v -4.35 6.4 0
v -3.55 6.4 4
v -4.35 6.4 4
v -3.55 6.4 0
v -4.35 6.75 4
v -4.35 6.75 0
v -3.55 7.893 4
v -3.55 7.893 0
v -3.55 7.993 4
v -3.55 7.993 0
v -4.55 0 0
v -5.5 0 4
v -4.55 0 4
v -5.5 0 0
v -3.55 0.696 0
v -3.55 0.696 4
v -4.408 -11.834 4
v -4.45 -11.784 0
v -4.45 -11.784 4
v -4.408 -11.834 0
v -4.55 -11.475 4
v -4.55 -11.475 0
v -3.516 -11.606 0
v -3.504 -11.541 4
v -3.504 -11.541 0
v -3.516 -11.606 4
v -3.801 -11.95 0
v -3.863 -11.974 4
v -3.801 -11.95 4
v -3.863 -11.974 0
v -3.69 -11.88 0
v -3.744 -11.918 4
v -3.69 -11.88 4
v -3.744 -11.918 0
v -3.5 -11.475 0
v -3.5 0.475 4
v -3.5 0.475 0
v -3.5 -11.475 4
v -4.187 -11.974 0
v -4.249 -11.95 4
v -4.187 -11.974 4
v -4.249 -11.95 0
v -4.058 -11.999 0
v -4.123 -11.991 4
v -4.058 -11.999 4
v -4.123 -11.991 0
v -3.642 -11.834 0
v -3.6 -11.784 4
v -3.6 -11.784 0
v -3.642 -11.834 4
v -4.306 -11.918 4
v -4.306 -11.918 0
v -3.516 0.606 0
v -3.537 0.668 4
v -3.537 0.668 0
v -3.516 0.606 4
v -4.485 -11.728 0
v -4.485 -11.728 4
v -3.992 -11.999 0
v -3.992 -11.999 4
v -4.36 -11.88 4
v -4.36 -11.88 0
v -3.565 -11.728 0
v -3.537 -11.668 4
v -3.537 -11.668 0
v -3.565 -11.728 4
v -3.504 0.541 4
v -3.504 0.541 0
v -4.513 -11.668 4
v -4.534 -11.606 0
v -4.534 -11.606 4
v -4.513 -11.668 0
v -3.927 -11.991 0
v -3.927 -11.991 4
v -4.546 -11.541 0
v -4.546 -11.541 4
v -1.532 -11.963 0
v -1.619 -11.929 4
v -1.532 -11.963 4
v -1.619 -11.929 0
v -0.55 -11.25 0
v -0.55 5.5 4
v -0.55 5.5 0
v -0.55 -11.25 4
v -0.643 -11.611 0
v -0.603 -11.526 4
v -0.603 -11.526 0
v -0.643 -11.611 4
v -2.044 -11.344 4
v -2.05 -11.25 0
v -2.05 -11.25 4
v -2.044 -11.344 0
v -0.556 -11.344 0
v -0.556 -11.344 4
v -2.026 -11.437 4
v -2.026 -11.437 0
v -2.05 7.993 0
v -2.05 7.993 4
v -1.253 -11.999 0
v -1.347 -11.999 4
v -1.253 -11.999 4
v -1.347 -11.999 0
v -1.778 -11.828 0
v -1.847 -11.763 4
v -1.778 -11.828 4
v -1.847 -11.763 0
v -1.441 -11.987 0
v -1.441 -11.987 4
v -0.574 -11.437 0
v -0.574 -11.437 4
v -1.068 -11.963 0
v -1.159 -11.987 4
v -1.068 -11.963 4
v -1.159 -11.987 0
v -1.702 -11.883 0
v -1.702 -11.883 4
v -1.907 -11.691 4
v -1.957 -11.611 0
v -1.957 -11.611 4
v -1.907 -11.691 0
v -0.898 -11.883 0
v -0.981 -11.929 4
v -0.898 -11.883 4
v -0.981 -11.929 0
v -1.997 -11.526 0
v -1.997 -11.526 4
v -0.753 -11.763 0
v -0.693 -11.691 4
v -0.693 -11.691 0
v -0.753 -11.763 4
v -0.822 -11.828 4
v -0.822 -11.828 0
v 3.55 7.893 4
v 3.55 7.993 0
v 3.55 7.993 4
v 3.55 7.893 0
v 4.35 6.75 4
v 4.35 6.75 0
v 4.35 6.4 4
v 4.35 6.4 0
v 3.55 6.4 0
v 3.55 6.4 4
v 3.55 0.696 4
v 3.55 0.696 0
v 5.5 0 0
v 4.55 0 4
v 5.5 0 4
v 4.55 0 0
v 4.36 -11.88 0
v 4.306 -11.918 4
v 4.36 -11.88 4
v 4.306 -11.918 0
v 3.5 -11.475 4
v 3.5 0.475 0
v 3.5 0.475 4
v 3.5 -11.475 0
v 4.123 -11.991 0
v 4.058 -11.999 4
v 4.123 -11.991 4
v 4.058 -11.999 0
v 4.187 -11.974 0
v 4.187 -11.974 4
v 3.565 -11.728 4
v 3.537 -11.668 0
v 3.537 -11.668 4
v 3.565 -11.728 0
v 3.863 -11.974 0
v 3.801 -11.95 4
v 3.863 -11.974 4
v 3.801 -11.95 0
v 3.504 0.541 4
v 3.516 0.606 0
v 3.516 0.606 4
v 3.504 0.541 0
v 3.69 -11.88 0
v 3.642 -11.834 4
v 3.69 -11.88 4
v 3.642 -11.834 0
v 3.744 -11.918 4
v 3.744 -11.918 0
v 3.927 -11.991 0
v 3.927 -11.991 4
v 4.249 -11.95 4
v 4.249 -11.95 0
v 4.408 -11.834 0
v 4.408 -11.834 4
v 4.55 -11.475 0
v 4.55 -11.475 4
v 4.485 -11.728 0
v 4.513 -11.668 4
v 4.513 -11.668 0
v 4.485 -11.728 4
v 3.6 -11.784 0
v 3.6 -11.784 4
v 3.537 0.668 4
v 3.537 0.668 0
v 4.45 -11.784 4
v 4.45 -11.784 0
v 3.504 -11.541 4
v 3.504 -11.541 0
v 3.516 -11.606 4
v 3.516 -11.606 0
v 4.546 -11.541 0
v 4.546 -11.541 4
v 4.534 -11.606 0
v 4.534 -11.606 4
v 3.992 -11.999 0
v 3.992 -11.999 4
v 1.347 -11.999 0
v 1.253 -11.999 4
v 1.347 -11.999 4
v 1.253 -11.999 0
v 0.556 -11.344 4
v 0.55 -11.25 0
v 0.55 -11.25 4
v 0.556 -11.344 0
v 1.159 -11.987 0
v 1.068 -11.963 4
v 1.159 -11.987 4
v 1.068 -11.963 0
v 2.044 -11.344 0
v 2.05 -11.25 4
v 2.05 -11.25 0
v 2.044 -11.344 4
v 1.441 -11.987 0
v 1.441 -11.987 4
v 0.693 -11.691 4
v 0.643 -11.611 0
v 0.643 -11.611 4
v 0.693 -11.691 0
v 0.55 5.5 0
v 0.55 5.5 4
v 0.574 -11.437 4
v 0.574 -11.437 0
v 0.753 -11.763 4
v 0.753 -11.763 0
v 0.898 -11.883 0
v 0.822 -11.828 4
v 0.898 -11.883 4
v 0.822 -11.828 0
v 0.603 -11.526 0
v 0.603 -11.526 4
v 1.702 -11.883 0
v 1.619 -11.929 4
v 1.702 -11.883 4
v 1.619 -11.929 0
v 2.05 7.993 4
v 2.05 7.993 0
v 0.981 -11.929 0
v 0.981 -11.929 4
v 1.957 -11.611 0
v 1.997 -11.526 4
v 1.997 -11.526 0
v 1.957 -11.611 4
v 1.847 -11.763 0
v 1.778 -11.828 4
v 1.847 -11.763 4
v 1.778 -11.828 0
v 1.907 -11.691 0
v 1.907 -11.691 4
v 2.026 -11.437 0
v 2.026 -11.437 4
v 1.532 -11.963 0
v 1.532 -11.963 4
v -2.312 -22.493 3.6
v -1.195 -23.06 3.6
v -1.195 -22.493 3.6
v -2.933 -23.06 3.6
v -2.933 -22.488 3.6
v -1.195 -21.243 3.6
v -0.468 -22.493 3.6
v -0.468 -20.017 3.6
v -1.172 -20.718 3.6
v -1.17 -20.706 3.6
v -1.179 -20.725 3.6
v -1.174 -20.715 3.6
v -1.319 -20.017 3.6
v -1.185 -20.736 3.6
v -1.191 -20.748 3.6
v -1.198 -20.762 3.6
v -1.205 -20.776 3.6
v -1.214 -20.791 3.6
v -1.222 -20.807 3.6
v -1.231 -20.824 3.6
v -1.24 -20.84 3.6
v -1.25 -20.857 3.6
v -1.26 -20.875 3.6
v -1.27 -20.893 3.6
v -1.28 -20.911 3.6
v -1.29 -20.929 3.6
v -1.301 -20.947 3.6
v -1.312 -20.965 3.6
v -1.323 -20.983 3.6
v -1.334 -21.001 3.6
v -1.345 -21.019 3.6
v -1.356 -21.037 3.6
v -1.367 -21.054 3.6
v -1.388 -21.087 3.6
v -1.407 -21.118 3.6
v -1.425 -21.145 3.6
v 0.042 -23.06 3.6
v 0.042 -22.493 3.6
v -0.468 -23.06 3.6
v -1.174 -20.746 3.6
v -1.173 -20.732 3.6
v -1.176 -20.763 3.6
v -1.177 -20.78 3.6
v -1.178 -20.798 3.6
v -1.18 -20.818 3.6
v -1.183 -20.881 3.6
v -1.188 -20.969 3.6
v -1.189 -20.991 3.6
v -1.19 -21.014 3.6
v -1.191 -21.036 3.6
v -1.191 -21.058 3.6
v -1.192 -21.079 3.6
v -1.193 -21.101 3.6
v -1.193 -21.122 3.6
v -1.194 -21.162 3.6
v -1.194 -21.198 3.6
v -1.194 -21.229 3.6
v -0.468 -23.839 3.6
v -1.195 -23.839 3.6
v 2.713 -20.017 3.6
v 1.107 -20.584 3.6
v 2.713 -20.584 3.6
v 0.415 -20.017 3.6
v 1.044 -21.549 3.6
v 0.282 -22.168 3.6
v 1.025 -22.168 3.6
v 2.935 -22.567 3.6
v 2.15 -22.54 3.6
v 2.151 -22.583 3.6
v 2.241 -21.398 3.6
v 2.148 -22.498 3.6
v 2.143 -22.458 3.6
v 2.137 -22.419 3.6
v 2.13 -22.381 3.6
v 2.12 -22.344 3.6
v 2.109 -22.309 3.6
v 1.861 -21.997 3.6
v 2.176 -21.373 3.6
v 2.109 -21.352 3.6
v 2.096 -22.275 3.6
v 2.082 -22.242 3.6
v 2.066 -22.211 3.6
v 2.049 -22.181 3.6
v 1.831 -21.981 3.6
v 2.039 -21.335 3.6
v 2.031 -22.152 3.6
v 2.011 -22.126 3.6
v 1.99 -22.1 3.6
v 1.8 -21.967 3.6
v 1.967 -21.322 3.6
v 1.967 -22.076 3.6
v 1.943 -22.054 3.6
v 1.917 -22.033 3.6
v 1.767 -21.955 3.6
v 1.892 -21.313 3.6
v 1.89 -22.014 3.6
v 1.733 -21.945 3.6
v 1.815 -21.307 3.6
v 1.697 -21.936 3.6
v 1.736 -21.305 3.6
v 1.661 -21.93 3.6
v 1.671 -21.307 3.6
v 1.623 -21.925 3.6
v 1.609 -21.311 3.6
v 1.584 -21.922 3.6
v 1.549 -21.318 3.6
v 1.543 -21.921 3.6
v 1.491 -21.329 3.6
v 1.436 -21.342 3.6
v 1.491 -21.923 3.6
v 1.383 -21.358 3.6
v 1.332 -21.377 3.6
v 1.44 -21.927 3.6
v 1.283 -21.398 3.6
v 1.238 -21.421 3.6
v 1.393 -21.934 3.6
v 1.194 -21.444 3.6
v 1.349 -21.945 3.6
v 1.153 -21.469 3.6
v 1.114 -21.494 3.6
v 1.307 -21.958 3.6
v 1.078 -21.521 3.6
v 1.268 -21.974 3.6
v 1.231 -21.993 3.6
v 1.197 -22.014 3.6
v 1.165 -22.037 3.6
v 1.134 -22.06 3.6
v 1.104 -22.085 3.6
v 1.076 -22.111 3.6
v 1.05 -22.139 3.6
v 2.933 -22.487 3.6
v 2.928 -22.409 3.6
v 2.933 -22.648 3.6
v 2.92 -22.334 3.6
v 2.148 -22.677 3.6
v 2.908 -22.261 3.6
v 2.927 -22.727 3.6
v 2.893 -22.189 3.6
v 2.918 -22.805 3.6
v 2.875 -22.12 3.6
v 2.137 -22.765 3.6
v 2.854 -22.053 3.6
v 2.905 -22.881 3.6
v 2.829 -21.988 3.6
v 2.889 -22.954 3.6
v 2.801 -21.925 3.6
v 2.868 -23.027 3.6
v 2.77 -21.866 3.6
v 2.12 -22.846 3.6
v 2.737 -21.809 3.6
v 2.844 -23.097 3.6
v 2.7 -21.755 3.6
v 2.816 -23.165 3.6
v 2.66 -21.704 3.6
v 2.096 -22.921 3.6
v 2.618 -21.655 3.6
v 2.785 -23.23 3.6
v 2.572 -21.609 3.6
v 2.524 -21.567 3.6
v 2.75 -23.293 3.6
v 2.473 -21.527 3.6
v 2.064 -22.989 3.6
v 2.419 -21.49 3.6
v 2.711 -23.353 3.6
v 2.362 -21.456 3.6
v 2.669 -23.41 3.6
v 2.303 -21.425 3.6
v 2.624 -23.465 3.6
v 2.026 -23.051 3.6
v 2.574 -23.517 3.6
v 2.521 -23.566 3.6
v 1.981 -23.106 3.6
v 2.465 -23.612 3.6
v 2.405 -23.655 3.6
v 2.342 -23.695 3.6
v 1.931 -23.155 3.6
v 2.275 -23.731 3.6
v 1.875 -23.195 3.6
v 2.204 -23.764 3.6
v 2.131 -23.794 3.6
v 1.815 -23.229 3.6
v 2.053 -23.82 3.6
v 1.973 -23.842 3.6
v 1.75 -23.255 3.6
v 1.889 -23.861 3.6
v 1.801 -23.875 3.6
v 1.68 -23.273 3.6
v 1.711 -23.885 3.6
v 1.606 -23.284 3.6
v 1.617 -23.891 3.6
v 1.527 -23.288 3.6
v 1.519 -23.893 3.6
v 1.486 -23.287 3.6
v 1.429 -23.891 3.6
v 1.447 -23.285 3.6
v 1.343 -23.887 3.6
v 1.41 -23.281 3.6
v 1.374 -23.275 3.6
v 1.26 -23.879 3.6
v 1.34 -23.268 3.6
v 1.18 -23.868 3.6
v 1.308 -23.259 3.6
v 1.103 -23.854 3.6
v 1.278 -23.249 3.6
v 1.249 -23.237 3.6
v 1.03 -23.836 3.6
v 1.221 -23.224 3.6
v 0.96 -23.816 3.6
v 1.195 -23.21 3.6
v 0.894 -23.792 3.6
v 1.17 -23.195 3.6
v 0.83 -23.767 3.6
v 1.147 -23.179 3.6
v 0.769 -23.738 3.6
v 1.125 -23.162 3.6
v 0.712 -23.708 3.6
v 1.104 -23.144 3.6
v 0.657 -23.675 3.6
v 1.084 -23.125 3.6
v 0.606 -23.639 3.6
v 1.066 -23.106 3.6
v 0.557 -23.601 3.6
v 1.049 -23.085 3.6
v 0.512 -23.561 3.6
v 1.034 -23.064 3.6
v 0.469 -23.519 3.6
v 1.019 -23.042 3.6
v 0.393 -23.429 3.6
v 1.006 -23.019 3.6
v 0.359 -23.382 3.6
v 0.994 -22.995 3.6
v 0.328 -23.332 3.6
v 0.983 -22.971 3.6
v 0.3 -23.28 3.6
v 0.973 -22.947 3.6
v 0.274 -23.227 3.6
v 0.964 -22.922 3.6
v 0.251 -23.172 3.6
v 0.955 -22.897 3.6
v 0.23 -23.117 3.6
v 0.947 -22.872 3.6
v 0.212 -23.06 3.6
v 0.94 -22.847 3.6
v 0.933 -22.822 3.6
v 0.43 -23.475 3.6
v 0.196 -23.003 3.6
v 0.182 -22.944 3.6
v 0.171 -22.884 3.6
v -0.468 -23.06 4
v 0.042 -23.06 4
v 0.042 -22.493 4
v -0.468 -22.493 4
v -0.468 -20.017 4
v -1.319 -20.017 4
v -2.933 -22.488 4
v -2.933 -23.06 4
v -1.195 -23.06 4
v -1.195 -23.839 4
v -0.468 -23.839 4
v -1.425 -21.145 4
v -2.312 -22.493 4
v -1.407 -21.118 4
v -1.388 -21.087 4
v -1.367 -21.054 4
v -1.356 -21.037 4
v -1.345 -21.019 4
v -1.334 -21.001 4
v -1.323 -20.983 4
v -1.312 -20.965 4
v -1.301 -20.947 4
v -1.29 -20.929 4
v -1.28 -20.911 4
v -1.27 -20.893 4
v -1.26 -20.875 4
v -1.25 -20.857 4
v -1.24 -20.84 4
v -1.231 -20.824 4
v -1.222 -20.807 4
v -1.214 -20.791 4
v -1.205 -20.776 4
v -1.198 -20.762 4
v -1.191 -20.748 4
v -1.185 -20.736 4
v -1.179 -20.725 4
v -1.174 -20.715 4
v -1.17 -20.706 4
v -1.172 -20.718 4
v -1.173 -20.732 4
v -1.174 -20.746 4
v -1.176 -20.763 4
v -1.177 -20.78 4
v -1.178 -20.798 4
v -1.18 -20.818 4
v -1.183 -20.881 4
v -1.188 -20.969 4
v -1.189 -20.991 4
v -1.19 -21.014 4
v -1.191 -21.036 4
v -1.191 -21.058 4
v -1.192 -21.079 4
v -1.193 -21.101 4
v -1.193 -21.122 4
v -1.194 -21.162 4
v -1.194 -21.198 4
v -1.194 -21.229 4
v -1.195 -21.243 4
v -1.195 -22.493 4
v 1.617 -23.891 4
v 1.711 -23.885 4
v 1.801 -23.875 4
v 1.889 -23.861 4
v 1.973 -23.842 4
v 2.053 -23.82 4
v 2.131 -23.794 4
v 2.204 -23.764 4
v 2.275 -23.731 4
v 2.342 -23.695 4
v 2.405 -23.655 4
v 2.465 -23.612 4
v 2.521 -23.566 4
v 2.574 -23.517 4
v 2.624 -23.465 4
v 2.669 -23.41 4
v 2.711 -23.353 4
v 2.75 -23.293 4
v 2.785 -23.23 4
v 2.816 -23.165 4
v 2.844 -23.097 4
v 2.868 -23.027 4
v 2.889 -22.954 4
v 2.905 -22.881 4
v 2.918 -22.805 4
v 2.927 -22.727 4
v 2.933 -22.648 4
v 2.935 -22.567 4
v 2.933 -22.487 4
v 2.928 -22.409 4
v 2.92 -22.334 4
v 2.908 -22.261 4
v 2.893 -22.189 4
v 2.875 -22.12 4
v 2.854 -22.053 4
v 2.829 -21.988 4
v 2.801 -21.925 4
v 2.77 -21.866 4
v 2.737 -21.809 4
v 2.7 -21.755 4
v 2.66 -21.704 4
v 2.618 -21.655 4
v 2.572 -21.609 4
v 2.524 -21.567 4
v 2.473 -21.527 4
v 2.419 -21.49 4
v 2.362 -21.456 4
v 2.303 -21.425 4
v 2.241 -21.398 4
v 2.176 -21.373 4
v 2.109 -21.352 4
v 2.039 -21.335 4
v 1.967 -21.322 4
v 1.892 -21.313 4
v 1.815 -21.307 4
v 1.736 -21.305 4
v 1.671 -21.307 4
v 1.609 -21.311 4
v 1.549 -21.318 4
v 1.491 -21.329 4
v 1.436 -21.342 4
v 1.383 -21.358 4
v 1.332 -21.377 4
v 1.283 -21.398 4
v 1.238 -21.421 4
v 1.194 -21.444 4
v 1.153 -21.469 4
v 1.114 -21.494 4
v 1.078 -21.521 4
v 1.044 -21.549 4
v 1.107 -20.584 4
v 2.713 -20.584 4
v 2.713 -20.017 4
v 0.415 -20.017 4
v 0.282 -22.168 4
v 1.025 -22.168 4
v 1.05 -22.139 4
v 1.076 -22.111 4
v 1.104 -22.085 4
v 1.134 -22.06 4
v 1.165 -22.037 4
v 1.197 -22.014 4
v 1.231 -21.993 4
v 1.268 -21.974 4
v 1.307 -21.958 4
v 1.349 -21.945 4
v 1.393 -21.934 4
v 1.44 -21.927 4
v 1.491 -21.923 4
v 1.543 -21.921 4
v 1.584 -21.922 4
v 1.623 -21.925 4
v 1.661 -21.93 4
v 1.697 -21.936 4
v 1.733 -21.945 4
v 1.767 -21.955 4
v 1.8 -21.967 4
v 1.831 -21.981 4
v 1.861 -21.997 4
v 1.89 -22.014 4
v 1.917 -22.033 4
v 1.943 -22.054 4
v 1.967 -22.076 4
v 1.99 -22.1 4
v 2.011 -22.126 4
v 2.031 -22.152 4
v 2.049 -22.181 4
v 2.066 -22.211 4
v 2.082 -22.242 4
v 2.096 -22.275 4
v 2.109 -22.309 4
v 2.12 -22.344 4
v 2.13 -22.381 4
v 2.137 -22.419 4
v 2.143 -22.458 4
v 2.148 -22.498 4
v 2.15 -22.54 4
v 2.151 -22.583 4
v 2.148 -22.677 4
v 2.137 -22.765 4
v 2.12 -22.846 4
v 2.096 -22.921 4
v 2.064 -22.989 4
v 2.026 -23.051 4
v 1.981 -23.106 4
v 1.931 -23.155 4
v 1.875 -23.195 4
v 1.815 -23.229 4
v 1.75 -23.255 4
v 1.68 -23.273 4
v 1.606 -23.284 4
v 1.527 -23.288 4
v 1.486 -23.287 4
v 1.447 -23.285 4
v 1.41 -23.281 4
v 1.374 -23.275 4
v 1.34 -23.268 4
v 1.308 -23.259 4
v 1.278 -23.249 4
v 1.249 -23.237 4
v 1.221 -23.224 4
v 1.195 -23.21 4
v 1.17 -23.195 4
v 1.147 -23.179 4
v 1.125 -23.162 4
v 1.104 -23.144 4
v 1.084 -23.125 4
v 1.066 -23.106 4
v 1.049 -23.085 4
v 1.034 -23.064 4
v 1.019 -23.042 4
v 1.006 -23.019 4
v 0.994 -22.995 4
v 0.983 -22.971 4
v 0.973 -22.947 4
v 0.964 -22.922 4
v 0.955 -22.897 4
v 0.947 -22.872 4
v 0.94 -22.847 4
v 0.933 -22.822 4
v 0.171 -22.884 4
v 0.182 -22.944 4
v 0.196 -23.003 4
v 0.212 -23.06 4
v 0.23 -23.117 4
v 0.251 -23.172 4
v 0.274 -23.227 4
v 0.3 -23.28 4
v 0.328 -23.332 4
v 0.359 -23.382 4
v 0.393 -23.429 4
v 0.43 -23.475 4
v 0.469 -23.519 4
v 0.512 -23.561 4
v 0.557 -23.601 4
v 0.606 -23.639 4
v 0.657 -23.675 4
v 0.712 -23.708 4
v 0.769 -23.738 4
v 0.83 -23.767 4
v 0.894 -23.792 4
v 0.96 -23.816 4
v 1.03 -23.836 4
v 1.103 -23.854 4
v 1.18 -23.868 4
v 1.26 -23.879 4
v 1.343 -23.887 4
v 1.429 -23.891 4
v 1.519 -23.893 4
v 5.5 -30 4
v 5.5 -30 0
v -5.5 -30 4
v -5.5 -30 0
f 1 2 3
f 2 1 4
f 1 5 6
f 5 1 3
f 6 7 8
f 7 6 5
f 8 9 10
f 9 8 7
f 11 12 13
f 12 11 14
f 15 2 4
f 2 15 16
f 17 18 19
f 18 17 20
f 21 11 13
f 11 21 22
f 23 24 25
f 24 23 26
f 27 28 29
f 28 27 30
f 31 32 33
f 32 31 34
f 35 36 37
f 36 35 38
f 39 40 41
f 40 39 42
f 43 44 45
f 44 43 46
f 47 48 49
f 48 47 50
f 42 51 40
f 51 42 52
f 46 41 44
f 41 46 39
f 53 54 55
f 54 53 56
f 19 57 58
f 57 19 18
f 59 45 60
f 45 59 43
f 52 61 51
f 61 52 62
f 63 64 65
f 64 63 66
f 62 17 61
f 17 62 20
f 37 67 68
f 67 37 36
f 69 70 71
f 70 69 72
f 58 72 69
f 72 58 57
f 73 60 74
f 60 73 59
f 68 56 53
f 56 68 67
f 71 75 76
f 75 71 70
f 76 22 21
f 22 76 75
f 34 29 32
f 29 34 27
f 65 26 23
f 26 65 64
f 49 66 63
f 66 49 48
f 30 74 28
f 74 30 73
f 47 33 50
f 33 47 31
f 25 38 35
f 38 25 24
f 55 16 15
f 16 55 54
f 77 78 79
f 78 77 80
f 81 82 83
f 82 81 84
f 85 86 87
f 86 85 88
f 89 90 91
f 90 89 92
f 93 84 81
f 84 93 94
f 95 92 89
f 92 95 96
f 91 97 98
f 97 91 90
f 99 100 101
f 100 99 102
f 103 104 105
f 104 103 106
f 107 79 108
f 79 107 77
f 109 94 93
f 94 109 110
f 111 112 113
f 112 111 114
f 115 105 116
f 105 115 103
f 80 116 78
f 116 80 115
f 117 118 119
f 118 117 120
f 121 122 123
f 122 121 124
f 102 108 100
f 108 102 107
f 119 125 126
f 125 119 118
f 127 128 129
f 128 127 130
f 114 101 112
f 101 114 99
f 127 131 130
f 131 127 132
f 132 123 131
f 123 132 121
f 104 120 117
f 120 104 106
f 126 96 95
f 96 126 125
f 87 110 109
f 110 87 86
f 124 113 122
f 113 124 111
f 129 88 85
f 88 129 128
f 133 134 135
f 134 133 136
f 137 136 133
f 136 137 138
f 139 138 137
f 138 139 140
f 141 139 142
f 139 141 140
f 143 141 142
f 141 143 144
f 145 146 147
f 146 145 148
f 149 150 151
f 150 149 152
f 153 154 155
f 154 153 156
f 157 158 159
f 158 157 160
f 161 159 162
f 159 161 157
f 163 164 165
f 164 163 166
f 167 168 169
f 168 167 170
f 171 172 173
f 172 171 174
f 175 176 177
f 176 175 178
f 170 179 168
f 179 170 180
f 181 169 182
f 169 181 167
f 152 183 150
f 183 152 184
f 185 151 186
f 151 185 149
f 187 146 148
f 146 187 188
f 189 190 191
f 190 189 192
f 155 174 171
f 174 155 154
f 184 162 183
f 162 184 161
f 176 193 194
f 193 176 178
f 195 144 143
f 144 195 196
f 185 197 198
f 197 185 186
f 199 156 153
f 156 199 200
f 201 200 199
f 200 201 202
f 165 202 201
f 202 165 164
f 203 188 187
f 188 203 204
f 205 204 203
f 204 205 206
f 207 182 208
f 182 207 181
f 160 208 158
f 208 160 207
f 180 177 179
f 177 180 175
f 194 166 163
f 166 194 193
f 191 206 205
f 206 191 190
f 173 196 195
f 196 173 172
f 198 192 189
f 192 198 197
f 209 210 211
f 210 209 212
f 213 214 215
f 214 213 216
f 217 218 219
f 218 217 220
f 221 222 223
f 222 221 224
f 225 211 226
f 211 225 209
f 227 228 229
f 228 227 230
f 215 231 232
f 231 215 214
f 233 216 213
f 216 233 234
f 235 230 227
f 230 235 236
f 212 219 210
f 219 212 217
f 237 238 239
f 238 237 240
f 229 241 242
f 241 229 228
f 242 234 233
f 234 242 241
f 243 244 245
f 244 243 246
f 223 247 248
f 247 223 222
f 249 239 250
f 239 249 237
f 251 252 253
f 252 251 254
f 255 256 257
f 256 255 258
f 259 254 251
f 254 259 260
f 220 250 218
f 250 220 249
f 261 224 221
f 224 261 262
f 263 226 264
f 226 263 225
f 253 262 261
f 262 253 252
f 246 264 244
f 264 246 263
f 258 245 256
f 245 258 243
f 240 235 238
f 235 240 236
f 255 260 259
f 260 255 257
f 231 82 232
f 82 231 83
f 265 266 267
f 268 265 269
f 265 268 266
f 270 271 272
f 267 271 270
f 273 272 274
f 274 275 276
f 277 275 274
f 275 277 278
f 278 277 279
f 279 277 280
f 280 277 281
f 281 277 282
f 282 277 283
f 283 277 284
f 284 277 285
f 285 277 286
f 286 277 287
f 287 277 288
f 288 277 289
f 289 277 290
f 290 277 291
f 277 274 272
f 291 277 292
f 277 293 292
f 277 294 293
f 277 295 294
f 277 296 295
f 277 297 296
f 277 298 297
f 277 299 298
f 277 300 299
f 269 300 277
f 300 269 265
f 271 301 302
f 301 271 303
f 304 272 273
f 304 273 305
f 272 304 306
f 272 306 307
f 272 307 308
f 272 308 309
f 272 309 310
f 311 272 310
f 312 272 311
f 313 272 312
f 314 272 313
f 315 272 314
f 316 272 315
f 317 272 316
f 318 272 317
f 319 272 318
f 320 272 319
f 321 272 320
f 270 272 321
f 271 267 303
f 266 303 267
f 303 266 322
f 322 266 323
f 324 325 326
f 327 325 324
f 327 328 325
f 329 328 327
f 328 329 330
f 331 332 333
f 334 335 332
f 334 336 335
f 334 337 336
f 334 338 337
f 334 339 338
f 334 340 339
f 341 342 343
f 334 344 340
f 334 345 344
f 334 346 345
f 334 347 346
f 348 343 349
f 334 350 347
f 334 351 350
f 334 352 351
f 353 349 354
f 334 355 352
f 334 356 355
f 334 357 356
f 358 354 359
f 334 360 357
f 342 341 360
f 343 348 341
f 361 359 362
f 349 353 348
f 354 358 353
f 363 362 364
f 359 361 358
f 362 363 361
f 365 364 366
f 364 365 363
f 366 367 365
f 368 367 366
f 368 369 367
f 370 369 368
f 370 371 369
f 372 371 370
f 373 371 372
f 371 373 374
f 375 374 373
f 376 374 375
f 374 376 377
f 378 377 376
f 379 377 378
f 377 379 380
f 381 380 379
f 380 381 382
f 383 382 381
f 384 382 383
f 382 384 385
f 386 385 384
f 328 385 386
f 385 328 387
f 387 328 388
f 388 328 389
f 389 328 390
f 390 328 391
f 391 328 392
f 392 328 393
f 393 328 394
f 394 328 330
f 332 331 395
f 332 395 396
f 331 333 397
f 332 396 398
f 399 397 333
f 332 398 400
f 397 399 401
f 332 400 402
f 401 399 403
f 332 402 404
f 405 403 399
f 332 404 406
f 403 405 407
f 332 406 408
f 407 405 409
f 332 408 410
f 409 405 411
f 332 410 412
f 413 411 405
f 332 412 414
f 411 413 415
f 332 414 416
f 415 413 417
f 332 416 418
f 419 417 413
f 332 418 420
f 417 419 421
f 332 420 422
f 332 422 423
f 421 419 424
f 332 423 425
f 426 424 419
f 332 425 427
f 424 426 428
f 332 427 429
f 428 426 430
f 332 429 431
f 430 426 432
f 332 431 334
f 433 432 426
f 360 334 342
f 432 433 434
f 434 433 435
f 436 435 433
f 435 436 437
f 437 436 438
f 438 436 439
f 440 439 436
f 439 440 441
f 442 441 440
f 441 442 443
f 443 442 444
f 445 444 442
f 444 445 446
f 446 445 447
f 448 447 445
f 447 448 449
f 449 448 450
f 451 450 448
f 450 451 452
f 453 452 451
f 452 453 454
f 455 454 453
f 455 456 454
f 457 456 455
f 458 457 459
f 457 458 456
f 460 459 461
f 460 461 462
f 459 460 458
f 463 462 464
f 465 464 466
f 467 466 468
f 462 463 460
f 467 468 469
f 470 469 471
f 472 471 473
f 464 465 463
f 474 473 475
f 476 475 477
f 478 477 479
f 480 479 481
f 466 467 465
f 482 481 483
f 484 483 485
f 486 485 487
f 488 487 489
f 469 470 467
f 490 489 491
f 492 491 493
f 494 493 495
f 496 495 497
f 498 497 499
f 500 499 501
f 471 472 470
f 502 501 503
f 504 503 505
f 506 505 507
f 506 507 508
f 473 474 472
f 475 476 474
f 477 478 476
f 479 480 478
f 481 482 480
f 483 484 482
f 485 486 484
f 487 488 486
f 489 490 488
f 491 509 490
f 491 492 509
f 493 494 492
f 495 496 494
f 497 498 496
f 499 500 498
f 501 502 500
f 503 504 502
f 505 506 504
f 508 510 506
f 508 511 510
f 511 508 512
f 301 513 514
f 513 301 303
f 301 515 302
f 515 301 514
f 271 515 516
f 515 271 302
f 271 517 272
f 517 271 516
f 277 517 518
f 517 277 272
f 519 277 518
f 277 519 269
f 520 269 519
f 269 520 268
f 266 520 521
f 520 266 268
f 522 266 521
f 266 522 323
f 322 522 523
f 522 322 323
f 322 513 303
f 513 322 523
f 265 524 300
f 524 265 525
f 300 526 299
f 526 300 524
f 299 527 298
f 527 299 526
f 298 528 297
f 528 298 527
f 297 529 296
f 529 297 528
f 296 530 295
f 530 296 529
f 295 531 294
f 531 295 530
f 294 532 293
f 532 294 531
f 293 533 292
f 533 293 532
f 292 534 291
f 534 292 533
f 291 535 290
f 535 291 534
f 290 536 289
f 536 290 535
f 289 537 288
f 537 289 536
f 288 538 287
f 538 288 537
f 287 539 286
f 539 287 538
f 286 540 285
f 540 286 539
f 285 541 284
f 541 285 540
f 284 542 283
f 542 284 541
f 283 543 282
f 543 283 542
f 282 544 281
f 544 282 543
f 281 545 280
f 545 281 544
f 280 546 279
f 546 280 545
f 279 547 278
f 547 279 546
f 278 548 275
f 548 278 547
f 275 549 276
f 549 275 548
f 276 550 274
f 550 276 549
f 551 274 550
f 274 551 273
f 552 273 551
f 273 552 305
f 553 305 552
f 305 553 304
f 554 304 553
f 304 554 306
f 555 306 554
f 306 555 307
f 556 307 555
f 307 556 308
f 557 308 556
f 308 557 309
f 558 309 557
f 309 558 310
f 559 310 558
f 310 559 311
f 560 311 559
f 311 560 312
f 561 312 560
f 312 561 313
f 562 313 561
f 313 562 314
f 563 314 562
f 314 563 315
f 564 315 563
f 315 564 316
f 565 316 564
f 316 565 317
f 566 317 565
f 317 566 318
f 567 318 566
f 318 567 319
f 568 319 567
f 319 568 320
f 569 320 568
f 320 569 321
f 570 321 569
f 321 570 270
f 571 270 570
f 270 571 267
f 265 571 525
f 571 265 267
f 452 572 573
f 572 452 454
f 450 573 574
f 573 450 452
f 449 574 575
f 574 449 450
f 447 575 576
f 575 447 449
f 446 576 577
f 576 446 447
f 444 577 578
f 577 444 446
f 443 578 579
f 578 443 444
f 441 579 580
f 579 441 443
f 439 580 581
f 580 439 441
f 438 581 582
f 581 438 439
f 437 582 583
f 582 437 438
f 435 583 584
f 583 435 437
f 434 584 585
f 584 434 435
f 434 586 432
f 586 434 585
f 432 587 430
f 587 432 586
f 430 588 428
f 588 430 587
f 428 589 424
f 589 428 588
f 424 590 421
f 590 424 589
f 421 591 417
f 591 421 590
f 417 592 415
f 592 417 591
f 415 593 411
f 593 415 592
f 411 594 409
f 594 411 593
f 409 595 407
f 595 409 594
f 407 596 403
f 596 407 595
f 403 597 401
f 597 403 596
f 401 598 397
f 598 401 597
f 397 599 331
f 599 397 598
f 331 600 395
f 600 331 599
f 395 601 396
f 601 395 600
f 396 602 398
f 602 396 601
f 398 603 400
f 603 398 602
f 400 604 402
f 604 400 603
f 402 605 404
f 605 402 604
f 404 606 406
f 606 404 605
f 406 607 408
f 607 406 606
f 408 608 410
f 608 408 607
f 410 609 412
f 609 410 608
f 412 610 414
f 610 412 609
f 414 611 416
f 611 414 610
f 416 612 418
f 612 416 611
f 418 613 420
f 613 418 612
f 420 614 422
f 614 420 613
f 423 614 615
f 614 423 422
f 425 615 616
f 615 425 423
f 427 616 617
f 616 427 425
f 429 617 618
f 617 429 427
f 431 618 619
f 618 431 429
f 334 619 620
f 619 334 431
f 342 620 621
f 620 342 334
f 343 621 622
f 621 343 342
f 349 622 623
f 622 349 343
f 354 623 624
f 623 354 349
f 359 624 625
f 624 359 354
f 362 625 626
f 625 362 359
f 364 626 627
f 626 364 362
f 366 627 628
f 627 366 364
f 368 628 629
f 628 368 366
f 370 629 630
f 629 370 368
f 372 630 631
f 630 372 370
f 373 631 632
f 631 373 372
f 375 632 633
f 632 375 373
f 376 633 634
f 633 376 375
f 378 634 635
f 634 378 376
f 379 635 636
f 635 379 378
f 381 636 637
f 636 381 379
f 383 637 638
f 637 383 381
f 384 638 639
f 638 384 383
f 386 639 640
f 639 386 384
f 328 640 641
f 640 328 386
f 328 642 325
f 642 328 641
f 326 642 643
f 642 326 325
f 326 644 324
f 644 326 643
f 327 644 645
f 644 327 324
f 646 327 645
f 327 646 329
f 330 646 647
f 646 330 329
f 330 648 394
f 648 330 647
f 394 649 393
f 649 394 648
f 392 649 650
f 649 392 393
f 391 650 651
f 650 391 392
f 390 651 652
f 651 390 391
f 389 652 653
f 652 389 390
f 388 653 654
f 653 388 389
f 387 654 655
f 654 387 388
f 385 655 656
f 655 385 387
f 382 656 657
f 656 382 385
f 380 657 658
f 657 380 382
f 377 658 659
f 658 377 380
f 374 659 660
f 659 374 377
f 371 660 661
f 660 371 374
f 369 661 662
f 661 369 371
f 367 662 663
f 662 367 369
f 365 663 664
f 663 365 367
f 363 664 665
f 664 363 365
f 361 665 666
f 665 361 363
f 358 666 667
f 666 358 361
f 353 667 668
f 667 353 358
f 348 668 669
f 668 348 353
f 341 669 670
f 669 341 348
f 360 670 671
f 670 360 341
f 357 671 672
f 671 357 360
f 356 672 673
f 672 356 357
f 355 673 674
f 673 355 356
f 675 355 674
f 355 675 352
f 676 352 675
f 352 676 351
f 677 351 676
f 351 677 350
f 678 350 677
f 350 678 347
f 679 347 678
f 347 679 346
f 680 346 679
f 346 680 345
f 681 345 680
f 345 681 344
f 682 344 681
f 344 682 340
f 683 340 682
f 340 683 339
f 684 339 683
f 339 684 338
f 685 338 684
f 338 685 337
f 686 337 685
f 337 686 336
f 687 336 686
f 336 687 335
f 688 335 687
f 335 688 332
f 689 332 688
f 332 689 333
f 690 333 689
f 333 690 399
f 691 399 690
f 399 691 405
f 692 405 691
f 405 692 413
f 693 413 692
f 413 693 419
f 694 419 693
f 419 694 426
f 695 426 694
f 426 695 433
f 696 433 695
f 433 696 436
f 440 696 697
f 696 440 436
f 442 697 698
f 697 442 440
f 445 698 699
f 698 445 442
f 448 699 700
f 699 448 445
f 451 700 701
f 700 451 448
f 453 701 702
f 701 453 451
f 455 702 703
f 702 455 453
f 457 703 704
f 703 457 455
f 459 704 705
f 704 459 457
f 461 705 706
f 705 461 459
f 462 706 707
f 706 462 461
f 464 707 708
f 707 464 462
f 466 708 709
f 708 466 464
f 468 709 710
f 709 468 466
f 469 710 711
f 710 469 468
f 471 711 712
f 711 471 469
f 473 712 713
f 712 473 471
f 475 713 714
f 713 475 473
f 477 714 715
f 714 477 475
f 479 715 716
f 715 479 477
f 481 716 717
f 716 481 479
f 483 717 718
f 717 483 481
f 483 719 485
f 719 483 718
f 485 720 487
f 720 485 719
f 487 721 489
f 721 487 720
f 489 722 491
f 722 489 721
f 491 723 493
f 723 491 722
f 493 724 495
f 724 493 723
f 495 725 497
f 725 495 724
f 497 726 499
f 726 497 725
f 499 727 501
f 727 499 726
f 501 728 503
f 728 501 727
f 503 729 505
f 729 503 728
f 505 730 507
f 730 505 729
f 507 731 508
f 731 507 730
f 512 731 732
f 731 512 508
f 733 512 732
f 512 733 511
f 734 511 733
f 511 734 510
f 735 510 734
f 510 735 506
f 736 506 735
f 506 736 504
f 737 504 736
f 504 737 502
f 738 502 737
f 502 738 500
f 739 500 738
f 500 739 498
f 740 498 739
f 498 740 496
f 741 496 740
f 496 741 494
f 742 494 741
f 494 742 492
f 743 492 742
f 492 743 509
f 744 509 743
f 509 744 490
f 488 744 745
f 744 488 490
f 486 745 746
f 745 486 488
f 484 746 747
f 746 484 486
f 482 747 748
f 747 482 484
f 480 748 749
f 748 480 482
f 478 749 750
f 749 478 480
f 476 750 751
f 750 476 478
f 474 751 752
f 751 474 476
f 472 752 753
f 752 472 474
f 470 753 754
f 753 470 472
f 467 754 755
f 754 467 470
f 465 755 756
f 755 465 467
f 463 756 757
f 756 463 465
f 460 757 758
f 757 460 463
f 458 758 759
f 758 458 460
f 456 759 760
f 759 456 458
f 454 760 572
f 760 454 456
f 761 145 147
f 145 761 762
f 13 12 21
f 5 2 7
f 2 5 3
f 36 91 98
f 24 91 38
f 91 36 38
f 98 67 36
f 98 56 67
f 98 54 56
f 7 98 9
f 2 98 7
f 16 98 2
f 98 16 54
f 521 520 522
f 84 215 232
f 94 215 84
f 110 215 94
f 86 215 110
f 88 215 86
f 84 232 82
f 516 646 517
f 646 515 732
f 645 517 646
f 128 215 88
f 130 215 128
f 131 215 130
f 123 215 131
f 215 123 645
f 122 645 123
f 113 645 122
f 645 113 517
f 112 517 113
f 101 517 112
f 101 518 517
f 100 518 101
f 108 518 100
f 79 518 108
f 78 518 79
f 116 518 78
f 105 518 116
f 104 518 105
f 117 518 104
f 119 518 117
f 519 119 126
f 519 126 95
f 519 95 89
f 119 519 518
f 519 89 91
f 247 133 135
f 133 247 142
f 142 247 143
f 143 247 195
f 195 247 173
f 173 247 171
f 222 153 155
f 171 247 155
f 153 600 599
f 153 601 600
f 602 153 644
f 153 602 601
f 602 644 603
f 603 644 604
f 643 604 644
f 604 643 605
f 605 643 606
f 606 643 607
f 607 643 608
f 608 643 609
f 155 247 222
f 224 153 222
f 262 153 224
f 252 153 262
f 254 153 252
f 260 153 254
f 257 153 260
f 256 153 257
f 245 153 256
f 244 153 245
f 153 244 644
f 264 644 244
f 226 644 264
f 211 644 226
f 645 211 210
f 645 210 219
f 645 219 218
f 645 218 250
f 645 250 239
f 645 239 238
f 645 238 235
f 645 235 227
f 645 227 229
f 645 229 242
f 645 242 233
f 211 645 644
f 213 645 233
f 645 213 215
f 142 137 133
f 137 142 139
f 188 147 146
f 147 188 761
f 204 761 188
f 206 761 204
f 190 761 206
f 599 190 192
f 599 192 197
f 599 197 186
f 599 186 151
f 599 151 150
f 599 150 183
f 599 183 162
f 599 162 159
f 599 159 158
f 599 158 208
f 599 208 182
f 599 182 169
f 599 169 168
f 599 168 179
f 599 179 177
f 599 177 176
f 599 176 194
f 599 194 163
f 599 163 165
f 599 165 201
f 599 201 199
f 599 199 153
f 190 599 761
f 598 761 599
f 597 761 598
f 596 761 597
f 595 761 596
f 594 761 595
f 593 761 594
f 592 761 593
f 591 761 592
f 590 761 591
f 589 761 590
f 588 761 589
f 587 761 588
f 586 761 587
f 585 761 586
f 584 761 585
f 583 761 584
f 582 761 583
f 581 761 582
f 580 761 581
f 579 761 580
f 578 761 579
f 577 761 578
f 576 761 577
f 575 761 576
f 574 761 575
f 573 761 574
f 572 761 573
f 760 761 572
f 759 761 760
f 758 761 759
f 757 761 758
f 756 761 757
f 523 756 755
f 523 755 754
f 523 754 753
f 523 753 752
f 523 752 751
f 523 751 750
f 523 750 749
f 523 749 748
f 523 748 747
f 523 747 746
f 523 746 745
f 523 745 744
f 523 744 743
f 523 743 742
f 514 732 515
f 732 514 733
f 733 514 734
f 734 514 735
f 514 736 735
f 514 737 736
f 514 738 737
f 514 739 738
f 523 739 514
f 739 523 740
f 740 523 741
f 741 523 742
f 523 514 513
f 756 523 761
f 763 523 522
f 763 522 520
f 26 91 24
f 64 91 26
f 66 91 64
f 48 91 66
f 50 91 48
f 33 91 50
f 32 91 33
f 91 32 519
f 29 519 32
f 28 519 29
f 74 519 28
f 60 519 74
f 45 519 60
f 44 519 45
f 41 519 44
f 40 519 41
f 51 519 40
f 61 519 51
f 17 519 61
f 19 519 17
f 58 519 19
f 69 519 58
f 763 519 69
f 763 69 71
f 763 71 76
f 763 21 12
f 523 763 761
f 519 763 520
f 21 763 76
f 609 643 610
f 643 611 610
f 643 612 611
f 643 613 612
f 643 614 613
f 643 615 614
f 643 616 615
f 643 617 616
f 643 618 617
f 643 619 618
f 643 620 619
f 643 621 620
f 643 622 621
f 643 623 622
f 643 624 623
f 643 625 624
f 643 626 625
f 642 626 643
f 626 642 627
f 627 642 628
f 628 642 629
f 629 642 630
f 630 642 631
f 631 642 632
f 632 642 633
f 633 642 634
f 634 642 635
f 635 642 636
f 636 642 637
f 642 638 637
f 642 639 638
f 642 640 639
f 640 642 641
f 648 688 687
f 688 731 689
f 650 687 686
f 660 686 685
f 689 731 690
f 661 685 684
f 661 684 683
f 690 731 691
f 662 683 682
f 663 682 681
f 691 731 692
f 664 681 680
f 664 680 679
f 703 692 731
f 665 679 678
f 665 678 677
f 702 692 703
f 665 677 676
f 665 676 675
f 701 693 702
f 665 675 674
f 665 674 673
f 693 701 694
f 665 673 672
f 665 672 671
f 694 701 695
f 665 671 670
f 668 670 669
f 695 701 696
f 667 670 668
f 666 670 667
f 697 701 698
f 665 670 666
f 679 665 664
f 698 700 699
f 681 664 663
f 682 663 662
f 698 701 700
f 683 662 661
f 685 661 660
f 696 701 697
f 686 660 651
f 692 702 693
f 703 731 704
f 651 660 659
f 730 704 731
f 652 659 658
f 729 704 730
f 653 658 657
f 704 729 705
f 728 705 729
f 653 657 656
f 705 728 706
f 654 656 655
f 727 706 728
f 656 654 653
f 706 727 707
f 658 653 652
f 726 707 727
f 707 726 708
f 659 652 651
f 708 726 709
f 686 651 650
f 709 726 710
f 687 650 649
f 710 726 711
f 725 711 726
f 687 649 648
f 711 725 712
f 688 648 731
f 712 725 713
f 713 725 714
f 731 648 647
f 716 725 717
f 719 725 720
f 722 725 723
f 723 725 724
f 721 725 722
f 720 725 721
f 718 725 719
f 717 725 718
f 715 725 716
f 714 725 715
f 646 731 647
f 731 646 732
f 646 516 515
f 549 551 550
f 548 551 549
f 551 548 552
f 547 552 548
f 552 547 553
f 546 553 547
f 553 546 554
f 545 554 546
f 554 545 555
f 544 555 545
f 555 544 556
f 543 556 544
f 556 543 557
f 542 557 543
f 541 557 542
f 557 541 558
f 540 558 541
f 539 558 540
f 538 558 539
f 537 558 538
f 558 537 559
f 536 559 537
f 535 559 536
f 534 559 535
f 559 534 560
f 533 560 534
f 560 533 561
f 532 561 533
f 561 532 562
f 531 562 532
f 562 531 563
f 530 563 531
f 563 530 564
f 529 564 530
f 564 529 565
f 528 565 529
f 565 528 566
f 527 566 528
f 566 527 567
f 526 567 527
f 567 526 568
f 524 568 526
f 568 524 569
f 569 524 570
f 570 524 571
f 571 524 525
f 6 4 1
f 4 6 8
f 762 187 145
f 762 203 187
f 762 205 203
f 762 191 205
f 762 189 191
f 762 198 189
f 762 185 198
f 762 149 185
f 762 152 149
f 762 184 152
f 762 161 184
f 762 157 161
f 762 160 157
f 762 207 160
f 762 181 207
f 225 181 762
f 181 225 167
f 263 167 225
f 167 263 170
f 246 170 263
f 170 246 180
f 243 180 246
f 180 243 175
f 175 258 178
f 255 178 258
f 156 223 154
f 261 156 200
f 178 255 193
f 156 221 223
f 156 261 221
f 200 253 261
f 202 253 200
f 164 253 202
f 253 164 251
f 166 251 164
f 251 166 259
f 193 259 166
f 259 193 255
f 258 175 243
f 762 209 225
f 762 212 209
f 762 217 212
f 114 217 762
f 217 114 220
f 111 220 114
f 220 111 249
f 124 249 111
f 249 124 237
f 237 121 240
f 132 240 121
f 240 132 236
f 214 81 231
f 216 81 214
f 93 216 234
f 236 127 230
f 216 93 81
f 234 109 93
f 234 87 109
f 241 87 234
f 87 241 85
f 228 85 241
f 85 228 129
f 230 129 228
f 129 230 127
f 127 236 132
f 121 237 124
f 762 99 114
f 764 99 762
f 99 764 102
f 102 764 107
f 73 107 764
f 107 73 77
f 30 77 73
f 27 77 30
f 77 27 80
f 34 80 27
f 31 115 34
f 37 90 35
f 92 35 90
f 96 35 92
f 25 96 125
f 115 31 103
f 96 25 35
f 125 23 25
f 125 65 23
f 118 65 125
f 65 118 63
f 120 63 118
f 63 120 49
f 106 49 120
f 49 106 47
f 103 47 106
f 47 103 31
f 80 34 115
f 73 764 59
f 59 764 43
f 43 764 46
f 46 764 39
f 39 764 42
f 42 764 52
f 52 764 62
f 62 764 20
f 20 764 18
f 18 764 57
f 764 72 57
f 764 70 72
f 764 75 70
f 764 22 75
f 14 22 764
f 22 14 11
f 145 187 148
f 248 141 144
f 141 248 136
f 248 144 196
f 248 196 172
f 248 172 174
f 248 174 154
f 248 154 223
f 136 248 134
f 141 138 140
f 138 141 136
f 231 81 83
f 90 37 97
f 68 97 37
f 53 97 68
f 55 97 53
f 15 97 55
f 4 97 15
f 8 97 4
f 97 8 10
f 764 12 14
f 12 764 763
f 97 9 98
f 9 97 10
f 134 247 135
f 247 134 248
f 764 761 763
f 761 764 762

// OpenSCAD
$fn = 50;

difference() {
	union() {
		translate(v = [0, 0, 0]) {
			rotate(a = [0, 0, 0]) {
				difference() {
					union() {
						translate(v = [-5.5, -30.0, 0]) {
							cube(size = [11.0, 37.99251840539369, 4.0]);
						}
					}
					union() {
						translate(v = [0, 0, -0.1]) {
							linear_extrude(height = 4.2) {
								polygon(points = [[-3.55, 0], [-3.55, 6.4], [-4.35, 6.4], [-4.35, 6.75], [-3.55, 7.892518405393692], [-3.55, 8.992518405393692], [-5.7, 8.992518405393692], [-5.7, 0]]);
							}
						}
						translate(v = [-4.0249999999999995, -5.5, -0.1]) {
							hull() {
								translate(v = [-0.0, 5.975, 0]) {
									cylinder(h = 4.2, r = 0.525);
								}
								translate(v = [0.0, 5.975, 0]) {
									cylinder(h = 4.2, r = 0.525);
								}
								translate(v = [-0.0, -5.975, 0]) {
									cylinder(h = 4.2, r = 0.525);
								}
								translate(v = [0.0, -5.975, 0]) {
									cylinder(h = 4.2, r = 0.525);
								}
							}
						}
						translate(v = [-1.2999999999999998, -1.5037407973031538, -0.1]) {
							hull() {
								translate(v = [-0.0, 9.746259202696846, 0]) {
									cylinder(h = 4.2, r = 0.7499999999999999);
								}
								translate(v = [0.0, 9.746259202696846, 0]) {
									cylinder(h = 4.2, r = 0.7499999999999999);
								}
								translate(v = [-0.0, -9.746259202696846, 0]) {
									cylinder(h = 4.2, r = 0.7499999999999999);
								}
								translate(v = [0.0, -9.746259202696846, 0]) {
									cylinder(h = 4.2, r = 0.7499999999999999);
								}
							}
						}
						translate(v = [0, 0, -0.1]) {
							linear_extrude(height = 4.2) {
								polygon(points = [[3.55, 0], [3.55, 6.4], [4.35, 6.4], [4.35, 6.75], [3.55, 7.892518405393692], [3.55, 8.992518405393692], [5.7, 8.992518405393692], [5.7, 0]]);
							}
						}
						translate(v = [4.0249999999999995, -5.5, -0.1]) {
							hull() {
								translate(v = [-0.0, 5.975, 0]) {
									cylinder(h = 4.2, r = 0.525);
								}
								translate(v = [0.0, 5.975, 0]) {
									cylinder(h = 4.2, r = 0.525);
								}
								translate(v = [-0.0, -5.975, 0]) {
									cylinder(h = 4.2, r = 0.525);
								}
								translate(v = [0.0, -5.975, 0]) {
									cylinder(h = 4.2, r = 0.525);
								}
							}
						}
						translate(v = [1.2999999999999998, -1.5037407973031538, -0.1]) {
							hull() {
								translate(v = [-0.0, 9.746259202696846, 0]) {
									cylinder(h = 4.2, r = 0.7499999999999999);
								}
								translate(v = [0.0, 9.746259202696846, 0]) {
									cylinder(h = 4.2, r = 0.7499999999999999);
								}
								translate(v = [-0.0, -9.746259202696846, 0]) {
									cylinder(h = 4.2, r = 0.7499999999999999);
								}
								translate(v = [0.0, -9.746259202696846, 0]) {
									cylinder(h = 4.2, r = 0.7499999999999999);
								}
							}
						}
						translate(v = [-0.6000000000000001, 5.5, -0.1]) {
							cube(size = [1.2000000000000002, 3.4925184053936915, 4.2]);
						}
						translate(v = [0, -22, 3.6]) {
							linear_extrude(height = 0.5) {
								text(font = "Arial:style=Bold", halign = "center", size = 4.0, text = "45", valign = "center");
							}
						}
					}
				}
			}
		}
	}
	union();
}
